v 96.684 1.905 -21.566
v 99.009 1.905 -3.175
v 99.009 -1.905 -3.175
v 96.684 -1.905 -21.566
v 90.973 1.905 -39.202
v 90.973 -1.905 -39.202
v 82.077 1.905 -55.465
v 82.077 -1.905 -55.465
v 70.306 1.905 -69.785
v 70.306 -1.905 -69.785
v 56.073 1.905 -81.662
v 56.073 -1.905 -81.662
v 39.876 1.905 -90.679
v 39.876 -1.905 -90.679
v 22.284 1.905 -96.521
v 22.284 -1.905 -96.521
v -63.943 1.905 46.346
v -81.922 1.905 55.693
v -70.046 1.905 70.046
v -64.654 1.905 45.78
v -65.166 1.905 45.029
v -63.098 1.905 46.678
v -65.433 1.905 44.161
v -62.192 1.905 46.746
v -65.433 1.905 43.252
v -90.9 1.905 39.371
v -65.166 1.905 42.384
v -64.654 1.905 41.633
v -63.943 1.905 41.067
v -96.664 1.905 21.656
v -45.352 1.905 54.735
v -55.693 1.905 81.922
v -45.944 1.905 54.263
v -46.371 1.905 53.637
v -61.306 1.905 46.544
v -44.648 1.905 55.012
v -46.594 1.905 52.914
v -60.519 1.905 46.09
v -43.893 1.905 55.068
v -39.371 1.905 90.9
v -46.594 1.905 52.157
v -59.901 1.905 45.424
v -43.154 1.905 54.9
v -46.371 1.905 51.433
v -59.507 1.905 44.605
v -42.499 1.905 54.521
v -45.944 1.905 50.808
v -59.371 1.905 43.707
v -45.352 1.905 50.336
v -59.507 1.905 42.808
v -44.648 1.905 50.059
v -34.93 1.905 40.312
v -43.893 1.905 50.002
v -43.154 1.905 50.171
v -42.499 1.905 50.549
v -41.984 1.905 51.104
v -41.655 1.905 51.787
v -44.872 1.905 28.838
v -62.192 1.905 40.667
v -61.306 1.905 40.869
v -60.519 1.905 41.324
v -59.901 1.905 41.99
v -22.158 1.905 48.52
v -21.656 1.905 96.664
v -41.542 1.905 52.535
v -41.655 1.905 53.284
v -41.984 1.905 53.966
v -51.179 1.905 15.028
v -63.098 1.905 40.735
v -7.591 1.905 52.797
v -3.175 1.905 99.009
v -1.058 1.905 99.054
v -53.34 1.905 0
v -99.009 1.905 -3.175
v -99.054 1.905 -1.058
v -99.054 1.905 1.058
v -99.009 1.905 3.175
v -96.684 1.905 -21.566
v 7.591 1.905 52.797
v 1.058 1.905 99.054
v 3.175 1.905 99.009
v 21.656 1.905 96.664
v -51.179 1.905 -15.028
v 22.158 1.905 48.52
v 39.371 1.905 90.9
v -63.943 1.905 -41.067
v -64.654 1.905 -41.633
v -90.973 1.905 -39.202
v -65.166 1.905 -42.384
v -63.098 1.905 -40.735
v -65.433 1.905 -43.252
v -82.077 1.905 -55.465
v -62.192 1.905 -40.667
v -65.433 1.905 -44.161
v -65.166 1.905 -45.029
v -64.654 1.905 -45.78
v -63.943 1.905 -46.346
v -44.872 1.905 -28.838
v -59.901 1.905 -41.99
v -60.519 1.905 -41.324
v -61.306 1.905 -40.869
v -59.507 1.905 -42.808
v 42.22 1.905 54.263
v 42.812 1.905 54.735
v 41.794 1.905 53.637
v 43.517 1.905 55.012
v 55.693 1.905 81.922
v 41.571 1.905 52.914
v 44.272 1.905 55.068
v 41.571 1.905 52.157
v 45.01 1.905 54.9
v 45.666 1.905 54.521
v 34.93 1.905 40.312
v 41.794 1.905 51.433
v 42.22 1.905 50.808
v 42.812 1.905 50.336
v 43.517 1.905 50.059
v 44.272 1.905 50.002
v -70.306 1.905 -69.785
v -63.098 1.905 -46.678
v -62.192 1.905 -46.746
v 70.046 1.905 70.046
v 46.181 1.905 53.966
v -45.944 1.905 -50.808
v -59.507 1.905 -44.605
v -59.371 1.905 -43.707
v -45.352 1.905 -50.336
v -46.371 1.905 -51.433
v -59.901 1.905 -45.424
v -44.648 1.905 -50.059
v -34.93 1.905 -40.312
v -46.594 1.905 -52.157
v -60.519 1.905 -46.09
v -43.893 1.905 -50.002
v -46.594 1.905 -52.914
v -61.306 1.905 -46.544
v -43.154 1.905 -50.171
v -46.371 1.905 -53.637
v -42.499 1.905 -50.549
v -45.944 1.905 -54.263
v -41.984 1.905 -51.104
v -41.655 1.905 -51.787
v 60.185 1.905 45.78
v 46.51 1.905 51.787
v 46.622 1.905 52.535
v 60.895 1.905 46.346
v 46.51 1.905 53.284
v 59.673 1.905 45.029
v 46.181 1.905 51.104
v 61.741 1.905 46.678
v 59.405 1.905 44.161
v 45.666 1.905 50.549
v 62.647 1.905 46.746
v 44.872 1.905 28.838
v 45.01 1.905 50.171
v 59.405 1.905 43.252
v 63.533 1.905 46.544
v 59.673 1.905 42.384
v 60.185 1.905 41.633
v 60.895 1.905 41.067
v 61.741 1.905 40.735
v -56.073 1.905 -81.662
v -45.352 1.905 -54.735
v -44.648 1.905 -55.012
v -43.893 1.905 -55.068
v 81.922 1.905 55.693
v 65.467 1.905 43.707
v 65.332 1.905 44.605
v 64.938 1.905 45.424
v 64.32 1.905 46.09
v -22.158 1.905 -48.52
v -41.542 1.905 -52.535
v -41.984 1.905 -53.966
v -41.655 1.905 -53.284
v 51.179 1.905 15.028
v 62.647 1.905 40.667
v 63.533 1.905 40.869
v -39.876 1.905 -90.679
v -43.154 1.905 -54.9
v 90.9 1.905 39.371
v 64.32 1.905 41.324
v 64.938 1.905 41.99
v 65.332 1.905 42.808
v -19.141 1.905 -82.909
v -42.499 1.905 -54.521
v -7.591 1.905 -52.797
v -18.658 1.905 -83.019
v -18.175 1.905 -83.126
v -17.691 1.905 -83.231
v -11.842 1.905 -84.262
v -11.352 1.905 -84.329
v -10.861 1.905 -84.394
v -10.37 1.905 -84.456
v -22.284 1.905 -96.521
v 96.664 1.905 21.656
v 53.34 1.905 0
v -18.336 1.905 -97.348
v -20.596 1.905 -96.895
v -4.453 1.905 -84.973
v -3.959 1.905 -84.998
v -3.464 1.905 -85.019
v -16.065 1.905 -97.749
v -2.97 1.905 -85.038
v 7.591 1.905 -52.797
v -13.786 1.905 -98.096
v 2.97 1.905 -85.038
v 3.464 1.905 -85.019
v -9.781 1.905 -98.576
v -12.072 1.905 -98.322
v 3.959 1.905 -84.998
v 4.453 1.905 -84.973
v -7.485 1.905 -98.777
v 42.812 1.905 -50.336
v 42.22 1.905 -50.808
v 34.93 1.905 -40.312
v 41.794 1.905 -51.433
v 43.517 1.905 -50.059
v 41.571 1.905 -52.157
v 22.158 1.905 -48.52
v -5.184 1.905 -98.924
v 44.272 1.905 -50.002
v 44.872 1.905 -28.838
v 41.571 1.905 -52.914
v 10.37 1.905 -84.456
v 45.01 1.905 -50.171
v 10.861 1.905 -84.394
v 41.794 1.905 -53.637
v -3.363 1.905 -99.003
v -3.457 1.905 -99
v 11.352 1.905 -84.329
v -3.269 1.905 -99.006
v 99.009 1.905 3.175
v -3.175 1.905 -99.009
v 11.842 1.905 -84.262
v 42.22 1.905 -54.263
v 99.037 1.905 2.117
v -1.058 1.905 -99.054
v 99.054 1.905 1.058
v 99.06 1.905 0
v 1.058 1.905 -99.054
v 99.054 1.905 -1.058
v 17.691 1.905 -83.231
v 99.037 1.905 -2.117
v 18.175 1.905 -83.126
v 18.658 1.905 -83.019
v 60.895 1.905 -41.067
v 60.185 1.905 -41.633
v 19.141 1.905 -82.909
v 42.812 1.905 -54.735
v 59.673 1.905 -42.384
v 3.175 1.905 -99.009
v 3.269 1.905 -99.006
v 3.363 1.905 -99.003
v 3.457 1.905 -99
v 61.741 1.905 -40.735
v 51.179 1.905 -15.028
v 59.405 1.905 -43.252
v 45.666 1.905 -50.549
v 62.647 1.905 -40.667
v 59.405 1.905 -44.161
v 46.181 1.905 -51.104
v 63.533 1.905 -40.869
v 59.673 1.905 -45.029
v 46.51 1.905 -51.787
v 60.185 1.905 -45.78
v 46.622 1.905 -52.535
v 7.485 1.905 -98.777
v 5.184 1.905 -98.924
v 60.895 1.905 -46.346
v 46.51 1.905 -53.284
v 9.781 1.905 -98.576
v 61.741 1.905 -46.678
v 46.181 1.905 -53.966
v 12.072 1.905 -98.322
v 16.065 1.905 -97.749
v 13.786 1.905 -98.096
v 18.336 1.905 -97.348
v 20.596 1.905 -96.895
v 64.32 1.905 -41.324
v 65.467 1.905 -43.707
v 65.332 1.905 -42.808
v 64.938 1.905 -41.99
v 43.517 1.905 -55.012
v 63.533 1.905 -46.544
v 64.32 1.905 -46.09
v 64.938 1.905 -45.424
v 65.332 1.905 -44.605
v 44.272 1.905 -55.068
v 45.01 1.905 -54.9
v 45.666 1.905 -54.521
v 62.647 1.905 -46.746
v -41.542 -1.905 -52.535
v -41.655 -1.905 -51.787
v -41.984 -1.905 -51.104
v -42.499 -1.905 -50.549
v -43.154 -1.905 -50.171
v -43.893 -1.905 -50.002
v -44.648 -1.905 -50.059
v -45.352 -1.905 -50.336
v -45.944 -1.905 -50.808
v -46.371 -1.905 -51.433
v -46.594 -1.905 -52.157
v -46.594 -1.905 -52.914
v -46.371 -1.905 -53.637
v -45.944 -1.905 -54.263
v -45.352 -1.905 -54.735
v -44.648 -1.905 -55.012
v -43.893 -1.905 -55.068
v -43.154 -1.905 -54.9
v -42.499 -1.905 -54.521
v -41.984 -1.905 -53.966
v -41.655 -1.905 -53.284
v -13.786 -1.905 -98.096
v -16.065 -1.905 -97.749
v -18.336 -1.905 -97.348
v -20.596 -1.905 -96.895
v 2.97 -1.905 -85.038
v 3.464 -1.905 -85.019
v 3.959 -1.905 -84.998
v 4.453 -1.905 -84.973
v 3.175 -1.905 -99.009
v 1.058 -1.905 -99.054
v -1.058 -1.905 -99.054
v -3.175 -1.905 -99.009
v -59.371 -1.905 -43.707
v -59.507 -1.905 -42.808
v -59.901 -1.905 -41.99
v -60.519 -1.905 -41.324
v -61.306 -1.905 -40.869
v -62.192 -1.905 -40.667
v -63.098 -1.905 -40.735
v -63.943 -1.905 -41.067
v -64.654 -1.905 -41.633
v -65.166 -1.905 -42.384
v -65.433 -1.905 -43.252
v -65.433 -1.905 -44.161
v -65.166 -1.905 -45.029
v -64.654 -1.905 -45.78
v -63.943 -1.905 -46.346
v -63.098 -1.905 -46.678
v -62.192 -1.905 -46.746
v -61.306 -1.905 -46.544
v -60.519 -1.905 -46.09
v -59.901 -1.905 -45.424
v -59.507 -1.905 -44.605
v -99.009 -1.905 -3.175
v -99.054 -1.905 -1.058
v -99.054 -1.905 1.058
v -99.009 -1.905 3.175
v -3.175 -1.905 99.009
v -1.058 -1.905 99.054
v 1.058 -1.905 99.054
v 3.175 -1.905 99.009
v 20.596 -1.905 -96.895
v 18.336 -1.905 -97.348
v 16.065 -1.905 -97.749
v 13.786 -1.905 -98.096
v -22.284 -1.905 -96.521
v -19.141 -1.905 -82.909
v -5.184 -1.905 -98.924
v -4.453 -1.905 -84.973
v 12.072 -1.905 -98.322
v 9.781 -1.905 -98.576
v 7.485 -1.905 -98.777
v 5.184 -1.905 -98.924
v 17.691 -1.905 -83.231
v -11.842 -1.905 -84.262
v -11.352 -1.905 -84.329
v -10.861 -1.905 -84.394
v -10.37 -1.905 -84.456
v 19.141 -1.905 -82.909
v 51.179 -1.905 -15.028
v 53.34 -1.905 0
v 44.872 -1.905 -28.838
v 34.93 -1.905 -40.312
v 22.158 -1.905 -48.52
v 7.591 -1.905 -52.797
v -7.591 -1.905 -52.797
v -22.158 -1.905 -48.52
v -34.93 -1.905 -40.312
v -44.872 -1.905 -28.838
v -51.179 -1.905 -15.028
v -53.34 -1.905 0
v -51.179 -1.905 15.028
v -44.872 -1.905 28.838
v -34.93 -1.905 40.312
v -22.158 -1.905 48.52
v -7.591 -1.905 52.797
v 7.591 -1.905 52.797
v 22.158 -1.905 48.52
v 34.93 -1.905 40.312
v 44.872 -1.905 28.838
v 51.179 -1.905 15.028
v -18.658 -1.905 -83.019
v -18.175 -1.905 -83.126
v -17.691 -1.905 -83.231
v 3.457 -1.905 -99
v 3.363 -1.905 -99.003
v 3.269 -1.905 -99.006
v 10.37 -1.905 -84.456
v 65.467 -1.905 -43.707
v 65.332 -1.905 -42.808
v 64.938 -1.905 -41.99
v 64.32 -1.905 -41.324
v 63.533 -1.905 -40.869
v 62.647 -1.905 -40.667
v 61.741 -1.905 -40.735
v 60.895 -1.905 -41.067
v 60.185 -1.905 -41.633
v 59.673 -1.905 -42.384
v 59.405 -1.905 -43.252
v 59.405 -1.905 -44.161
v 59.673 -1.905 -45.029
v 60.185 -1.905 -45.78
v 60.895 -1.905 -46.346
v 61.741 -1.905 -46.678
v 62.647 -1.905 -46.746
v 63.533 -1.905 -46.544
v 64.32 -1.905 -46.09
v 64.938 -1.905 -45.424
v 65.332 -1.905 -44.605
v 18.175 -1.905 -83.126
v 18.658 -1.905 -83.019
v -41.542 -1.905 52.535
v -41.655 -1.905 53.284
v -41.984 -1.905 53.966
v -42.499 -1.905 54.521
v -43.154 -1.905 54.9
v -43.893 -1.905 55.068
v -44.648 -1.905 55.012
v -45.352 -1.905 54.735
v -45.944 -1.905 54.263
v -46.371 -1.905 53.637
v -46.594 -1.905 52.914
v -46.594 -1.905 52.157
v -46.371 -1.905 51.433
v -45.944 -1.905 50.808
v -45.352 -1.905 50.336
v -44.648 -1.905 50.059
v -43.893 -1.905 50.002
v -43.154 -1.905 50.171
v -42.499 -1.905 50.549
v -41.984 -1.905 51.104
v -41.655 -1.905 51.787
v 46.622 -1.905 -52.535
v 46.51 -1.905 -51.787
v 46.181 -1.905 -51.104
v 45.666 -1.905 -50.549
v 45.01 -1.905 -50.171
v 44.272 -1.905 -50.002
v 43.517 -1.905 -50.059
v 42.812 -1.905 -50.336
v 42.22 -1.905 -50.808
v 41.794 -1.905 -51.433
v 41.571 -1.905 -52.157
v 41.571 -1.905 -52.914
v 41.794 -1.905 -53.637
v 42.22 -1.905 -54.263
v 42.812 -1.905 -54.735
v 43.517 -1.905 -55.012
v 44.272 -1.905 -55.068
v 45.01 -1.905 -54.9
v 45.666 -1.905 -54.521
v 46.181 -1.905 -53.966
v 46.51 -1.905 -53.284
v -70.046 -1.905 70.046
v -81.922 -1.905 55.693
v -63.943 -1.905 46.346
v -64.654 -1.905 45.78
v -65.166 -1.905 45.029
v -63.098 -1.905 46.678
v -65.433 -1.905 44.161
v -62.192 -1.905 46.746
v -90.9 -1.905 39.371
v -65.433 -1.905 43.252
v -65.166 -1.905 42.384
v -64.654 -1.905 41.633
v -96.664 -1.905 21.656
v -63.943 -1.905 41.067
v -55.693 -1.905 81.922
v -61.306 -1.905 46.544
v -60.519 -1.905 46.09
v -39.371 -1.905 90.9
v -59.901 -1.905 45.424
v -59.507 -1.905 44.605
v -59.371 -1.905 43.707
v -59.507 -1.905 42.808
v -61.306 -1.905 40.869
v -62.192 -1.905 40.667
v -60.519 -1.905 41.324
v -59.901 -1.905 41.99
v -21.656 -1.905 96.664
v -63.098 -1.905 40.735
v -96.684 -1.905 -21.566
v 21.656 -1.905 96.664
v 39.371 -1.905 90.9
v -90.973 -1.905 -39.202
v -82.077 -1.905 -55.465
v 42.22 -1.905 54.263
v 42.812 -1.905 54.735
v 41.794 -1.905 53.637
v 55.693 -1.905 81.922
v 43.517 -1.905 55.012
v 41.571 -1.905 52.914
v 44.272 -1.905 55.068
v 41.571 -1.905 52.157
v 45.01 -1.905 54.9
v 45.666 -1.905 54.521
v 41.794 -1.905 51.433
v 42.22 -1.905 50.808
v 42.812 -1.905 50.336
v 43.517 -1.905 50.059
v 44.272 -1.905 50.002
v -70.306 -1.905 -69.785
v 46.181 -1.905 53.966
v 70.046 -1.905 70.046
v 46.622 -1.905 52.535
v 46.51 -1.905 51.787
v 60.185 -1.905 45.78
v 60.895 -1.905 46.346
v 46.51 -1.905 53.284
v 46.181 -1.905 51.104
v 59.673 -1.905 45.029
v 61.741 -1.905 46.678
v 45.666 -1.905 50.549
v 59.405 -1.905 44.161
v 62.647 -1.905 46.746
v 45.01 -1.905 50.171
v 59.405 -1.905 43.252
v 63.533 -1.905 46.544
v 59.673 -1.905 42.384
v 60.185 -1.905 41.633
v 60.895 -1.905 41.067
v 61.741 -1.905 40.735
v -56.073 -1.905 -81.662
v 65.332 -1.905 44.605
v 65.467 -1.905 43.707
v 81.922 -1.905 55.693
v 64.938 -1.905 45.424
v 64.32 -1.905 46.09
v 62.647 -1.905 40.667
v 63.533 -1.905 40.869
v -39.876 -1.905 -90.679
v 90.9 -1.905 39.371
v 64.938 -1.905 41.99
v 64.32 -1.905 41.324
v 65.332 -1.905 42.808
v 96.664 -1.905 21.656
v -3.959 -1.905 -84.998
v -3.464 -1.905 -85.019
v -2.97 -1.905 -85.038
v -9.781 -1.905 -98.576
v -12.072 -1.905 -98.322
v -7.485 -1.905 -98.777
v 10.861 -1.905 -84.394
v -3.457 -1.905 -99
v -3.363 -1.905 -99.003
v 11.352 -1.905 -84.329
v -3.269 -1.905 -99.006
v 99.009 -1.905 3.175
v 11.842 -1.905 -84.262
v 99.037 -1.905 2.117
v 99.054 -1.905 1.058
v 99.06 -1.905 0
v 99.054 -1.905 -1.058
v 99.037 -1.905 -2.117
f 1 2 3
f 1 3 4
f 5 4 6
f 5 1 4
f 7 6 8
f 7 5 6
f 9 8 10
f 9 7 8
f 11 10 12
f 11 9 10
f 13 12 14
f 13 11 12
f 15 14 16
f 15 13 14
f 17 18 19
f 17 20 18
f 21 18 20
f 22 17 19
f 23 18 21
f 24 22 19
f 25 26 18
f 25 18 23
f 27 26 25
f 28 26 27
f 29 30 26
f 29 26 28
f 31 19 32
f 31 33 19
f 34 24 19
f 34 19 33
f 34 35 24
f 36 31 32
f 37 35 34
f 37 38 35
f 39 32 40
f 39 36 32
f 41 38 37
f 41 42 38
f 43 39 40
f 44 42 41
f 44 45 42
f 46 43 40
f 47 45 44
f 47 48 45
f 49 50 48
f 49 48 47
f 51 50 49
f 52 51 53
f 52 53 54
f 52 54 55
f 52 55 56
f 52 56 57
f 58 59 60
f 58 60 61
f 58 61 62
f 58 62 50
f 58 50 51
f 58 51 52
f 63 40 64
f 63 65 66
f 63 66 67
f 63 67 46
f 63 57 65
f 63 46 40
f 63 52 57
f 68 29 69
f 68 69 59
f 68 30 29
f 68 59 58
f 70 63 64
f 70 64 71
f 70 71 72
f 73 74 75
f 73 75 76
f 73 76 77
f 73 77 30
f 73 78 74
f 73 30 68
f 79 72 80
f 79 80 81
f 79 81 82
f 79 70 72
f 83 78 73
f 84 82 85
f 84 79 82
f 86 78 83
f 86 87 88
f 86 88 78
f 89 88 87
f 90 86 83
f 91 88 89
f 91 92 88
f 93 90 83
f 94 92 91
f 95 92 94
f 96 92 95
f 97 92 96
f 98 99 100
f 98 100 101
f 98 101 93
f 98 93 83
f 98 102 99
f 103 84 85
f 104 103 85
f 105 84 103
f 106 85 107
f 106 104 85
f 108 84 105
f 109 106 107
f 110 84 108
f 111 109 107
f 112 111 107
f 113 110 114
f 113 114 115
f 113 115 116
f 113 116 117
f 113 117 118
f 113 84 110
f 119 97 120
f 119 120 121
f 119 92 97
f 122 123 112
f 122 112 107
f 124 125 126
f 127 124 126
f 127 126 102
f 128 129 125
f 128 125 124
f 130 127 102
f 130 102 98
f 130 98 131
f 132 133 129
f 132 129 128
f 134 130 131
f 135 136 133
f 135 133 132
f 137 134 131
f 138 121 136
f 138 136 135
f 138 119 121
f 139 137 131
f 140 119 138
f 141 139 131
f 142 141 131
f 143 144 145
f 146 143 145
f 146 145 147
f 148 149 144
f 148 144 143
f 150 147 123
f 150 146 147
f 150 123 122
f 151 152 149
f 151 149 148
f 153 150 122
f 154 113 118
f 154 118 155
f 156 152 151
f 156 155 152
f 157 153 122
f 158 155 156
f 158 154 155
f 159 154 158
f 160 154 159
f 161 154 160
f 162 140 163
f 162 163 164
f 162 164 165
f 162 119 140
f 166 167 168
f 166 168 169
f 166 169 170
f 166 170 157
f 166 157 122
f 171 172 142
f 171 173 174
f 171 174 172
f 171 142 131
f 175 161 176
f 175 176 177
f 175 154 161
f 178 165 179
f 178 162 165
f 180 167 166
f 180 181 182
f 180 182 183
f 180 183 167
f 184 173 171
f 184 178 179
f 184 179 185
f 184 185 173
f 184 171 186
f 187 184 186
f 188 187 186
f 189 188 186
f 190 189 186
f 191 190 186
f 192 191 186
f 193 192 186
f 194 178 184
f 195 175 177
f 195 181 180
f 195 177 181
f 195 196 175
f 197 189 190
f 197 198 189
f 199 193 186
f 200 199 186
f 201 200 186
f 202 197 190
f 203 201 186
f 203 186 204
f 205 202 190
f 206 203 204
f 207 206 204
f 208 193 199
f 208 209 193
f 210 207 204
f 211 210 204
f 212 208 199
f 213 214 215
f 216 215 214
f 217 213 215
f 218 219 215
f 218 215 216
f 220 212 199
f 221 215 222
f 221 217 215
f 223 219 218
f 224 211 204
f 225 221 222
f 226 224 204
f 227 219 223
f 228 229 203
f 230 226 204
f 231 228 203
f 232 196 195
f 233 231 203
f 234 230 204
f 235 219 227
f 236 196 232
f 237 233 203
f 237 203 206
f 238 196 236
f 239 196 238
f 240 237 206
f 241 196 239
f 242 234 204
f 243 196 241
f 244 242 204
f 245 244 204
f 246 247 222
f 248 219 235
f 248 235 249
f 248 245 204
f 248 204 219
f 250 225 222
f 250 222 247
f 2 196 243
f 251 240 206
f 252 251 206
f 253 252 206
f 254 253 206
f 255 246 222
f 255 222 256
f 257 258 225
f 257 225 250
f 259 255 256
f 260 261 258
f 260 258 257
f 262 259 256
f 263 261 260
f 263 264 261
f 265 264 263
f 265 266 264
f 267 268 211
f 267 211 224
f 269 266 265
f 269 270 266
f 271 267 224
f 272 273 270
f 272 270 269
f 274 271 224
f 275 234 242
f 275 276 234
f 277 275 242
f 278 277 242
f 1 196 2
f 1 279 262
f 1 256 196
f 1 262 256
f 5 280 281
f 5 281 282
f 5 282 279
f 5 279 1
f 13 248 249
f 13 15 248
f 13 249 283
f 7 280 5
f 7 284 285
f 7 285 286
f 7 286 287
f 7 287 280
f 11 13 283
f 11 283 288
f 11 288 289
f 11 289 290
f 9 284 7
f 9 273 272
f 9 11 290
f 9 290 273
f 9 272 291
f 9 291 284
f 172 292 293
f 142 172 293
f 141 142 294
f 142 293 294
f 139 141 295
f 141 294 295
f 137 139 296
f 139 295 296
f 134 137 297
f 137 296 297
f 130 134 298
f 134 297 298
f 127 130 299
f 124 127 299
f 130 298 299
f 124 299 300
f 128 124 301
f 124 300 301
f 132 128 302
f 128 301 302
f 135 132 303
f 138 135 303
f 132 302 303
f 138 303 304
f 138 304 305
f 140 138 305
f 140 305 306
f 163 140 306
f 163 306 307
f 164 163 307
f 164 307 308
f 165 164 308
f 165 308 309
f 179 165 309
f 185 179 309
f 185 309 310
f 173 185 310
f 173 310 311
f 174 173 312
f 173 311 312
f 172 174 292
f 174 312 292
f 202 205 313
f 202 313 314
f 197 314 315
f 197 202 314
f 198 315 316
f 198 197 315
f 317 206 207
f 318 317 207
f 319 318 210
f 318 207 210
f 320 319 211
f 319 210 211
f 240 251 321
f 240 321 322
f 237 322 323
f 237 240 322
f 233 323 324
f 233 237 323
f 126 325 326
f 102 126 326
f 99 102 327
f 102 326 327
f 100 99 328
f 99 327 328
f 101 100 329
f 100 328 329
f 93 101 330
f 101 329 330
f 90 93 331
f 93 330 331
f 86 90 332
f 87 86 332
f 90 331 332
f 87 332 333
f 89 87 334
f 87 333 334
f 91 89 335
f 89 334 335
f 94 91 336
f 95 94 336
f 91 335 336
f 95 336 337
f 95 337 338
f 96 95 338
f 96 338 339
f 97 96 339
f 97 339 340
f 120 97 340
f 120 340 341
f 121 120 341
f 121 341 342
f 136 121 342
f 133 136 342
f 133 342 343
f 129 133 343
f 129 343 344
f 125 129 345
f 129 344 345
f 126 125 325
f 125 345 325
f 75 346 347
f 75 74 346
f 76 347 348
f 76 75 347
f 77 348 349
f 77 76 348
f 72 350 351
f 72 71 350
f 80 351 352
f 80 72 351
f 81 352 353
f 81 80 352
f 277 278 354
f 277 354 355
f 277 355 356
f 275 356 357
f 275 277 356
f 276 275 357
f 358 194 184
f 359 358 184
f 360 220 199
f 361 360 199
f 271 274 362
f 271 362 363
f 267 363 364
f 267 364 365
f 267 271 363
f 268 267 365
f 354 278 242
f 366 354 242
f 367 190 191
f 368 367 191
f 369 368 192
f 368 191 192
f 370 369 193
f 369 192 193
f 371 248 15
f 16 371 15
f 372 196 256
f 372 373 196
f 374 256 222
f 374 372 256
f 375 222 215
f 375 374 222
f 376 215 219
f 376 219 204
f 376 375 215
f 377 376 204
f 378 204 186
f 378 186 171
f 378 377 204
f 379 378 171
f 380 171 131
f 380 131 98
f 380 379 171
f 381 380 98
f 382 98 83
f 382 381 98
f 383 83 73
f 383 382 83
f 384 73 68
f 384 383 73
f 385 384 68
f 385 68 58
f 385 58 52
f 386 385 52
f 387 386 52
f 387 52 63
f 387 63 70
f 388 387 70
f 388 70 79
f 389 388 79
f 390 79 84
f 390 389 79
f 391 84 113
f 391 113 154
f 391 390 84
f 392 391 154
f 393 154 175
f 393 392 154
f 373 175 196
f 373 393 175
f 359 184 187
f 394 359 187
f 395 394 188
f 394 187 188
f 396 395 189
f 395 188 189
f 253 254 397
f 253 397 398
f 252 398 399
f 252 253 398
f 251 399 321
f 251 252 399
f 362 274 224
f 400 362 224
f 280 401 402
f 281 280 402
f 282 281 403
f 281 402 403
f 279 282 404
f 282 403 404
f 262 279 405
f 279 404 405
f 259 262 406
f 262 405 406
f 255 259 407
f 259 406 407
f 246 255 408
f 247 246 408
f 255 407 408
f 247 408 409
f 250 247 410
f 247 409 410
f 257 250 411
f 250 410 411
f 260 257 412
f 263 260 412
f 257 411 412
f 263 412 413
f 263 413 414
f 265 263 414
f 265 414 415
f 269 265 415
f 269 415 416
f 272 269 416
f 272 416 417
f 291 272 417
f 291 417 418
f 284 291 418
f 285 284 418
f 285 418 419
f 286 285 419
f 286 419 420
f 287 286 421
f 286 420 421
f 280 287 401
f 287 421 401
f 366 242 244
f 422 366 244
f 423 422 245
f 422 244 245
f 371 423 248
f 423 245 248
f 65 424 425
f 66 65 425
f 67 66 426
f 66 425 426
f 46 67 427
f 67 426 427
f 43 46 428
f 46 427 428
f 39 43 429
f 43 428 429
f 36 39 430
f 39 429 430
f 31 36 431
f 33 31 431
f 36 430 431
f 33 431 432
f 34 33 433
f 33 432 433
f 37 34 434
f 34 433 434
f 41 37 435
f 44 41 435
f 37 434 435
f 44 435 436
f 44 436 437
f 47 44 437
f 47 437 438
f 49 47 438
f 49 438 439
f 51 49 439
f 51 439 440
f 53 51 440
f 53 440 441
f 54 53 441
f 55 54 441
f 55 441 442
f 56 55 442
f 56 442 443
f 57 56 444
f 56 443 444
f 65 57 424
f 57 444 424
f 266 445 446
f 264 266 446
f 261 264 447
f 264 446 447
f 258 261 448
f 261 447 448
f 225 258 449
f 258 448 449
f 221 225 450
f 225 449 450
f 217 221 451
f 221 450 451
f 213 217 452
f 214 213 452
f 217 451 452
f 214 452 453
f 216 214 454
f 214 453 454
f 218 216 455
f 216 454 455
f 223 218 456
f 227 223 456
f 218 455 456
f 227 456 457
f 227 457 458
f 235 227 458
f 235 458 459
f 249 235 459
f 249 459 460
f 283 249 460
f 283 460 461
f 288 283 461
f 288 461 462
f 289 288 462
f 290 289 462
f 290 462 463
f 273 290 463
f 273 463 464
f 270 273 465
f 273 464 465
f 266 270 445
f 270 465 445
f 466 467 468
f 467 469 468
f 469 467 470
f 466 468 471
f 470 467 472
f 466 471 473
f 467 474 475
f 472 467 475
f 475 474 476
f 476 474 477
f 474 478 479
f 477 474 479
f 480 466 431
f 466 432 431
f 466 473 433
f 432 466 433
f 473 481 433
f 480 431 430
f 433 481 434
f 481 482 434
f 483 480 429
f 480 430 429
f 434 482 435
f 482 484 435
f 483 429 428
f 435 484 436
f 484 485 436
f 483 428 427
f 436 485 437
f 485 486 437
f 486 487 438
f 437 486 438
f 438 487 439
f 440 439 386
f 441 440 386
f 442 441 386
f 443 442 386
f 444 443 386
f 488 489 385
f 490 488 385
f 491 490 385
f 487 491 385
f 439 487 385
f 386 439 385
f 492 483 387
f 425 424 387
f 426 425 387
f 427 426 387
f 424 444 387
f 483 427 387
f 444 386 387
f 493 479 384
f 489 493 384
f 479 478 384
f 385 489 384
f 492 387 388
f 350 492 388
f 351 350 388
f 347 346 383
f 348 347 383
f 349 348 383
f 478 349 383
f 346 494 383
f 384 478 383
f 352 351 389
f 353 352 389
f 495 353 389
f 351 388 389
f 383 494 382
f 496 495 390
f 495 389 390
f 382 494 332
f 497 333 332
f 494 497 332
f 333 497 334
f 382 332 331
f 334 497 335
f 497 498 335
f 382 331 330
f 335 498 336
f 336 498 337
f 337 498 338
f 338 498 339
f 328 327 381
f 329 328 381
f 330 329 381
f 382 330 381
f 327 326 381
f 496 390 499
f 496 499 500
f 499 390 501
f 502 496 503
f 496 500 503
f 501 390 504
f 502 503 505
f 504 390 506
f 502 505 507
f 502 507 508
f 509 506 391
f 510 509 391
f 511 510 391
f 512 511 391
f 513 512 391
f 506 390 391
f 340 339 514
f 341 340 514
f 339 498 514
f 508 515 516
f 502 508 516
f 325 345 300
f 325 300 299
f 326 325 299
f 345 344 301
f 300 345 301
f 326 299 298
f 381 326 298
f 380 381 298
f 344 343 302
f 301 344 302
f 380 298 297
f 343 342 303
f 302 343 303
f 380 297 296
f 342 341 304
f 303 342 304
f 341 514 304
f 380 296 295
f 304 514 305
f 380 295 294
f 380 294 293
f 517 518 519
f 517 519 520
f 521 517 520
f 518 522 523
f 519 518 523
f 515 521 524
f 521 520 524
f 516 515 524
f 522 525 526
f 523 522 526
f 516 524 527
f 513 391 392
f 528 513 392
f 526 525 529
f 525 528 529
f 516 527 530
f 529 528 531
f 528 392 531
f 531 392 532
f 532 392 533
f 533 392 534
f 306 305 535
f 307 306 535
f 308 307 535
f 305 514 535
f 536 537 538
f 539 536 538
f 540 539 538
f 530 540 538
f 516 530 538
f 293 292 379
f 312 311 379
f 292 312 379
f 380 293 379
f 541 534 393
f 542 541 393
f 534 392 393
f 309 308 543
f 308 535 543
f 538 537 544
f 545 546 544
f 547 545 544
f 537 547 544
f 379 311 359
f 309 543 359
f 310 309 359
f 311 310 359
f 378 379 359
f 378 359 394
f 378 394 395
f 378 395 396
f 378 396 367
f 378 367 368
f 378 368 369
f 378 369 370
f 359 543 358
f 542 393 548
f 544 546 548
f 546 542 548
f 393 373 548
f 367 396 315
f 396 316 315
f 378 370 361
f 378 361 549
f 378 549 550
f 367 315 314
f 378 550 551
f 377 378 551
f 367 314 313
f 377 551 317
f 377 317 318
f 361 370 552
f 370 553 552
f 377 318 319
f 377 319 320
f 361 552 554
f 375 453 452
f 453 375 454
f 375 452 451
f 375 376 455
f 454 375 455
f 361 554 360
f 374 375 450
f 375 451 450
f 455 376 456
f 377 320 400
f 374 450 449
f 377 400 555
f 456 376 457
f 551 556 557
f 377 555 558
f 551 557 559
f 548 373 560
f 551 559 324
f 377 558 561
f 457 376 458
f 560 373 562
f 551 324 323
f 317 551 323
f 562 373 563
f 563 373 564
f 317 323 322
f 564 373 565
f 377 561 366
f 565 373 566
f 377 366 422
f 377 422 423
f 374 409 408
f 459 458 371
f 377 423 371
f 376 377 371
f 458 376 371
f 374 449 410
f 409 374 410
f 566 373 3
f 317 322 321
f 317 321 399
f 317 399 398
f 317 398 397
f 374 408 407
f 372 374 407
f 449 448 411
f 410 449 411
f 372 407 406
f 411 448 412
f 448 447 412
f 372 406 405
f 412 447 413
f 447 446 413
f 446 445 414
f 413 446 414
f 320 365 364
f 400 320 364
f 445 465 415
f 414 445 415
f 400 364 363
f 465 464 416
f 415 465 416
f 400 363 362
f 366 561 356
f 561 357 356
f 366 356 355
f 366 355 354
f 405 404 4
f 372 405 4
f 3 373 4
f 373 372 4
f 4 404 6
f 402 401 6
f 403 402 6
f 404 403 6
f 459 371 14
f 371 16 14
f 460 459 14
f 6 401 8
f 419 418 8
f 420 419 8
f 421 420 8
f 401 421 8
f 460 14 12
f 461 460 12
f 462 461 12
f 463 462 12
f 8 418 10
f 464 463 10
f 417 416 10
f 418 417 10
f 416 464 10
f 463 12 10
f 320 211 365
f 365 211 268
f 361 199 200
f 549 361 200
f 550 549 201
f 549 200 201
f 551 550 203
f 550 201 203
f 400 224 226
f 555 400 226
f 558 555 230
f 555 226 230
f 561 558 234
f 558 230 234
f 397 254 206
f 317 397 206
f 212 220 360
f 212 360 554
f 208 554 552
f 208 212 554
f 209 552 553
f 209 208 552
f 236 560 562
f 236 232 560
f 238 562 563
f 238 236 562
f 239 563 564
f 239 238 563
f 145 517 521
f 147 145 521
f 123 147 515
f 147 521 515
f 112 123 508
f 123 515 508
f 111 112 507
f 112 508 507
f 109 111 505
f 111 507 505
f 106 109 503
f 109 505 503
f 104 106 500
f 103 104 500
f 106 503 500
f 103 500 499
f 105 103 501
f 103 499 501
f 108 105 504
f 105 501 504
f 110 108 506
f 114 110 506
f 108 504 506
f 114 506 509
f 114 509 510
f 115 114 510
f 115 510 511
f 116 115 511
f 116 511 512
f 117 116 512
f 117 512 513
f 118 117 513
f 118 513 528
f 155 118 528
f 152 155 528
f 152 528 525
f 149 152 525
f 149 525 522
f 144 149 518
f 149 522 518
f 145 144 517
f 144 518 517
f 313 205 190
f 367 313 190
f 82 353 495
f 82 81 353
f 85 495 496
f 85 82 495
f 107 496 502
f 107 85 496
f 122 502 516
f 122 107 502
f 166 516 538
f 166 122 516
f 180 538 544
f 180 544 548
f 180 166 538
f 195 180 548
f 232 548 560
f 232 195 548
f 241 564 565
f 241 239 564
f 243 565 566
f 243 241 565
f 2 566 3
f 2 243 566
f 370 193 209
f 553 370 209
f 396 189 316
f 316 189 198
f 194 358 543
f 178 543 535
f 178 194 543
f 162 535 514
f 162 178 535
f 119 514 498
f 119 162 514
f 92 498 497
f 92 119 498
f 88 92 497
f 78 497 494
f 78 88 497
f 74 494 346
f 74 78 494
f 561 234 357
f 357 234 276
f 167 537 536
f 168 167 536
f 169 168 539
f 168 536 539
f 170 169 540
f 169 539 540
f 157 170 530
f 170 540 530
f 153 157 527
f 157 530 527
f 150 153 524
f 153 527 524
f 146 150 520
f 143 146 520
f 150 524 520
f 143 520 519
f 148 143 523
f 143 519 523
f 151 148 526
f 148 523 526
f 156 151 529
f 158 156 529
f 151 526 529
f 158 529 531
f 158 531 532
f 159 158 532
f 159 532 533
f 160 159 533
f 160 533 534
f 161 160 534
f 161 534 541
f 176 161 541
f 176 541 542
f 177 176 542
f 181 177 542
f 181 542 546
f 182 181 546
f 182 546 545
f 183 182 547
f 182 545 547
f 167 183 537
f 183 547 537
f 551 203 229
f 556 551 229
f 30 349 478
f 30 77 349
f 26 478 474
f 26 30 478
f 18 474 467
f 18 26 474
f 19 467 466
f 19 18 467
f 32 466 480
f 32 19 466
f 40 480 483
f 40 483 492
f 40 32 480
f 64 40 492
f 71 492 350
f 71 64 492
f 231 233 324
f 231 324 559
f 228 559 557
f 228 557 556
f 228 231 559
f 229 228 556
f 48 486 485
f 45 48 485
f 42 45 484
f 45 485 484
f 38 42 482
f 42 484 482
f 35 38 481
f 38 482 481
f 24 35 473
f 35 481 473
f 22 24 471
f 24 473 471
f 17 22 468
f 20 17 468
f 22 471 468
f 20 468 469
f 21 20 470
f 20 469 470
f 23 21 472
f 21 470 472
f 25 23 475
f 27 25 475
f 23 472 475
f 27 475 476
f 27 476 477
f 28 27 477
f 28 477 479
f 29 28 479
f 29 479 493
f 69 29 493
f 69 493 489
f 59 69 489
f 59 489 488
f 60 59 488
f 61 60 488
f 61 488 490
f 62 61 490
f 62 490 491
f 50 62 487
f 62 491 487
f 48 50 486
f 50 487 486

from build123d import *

# Parameters (mm, degrees)
F_98MM_6ID_CENTERING_RING_SKETCH_7_R = 53.34
CENTERING_RING_EXTRUDE_DEPTH         = 1.905
CENTERING_RING_EXTRUDE_DEPTH_BACK    = 1.905
CUT_EXTRUDE3_DEPTH                   = 4.81
CIRPATTERN1_COUNT                    = 6
CIRPATTERN1_ANGLE                    = 25
SKETCH5_R                            = 3.048
SKETCH5_R_2                          = 2.54
CUT_EXTRUDE4_DEPTH                   = 3.81


with BuildPart() as part:
    # 98mm - 6ID centering ring sketch_7 → Centering Ring Extrude (new body, two sides)
    with BuildSketch(Plane(origin=(0, 0, 0), x_dir=(1, 0, 0), z_dir=(0, 1, 0))) as centering_ring_extrude_sk:
        with BuildLine():
            Line((56.425744124, 3.175), (99.009105516, 3.175))
            ThreePointArc((99.009105516, 3.175), (70.045997744, 70.045997744), (3.175, 99.009105516))
            Line((3.175, 99.009105516), (3.175, 56.425744124))
            ThreePointArc((3.175, 56.425744124), (0, 56.515), (-3.175, 56.425744124))
            Line((-3.175, 56.425744124), (-3.175, 99.009105516))
            ThreePointArc((-3.175, 99.009105516), (-70.045997744, 70.045997744), (-99.009105516, 3.175))
            Line((-99.009105516, 3.175), (-56.425744124, 3.175))
            ThreePointArc((-56.425744124, 3.175), (-56.515, 0), (-56.425744124, -3.175))
            Line((-56.425744124, -3.175), (-99.009105516, -3.175))
            ThreePointArc((-99.009105516, -3.175), (-70.045997744, -70.045997744), (-3.175, -99.009105516))
            Line((-3.175, -99.009105516), (-3.175, -56.425744124))
            ThreePointArc((-3.175, -56.425744124), (0, -56.515), (3.175, -56.425744124))
            Line((3.175, -56.425744124), (3.175, -99.009105516))
            ThreePointArc((3.175, -99.009105516), (70.045997744, -70.045997744), (99.009105516, -3.175))
            Line((99.009105516, -3.175), (56.425744124, -3.175))
            ThreePointArc((56.425744124, -3.175), (56.515, 0), (56.425744124, 3.175))
        make_face()
        Circle(F_98MM_6ID_CENTERING_RING_SKETCH_7_R, mode=Mode.SUBTRACT)
        with BuildLine():
            ThreePointArc((99.06, 0), (99.047275562, 1.587703943), (99.009105516, 3.175))
            Line((99.009105516, 3.175), (56.425744124, 3.175))
            ThreePointArc((56.425744124, 3.175), (56.515, 0), (56.425744124, -3.175))
            Line((56.425744124, -3.175), (99.009105516, -3.175))
            ThreePointArc((99.009105516, -3.175), (99.047275562, -1.587703943), (99.06, 0))
        make_face()
        with BuildLine():
            Line((3.175, 56.425744124), (3.175, 99.009105516))
            ThreePointArc((3.175, 99.009105516), (0, 99.06), (-3.175, 99.009105516))
            Line((-3.175, 99.009105516), (-3.175, 56.425744124))
            ThreePointArc((-3.175, 56.425744124), (0, 56.515), (3.175, 56.425744124))
        make_face()
        with BuildLine():
            Line((-56.425744124, 3.175), (-99.009105516, 3.175))
            ThreePointArc((-99.009105516, 3.175), (-99.06, 0), (-99.009105516, -3.175))
            Line((-99.009105516, -3.175), (-56.425744124, -3.175))
            ThreePointArc((-56.425744124, -3.175), (-56.515, 0), (-56.425744124, 3.175))
        make_face()
        with BuildLine():
            ThreePointArc((-3.175, -99.009105516), (0, -99.06), (3.175, -99.009105516))
            Line((3.175, -99.009105516), (3.175, -56.425744124))
            ThreePointArc((3.175, -56.425744124), (0, -56.515), (-3.175, -56.425744124))
            Line((-3.175, -56.425744124), (-3.175, -99.009105516))
        make_face()
    extrude(amount=CENTERING_RING_EXTRUDE_DEPTH)
    extrude(centering_ring_extrude_sk.sketch, amount=-CENTERING_RING_EXTRUDE_DEPTH_BACK)

    # Sketch3 → Cut-Extrude3 (cut, through all)
    with BuildSketch(Plane(origin=(0, 1.905, 0), x_dir=(1, 0, 0), z_dir=(0, 1, 0))):
        with BuildLine():
            Line((-22.283651443, 96.521098618), (-19.141085214, 82.909148813))
            ThreePointArc((-19.141085214, 82.909148813), (-18.41684675, 83.073027246), (-17.691205772, 83.230579346))
            Line((-17.691205772, 83.230579346), (-20.595732092, 96.895301329))
            ThreePointArc((-20.595732092, 96.895301329), (-21.440508157, 96.711882465), (-22.283651443, 96.521098618))
        make_face()
    cut_extrude3 = extrude(amount=-CUT_EXTRUDE3_DEPTH, mode=Mode.SUBTRACT)

    # CirPattern1: Cut-Extrude3 ×6 about axis
    cirpattern1_axis = Axis((0, 0, 0), (0, -1, 0))
    for i in range(1, CIRPATTERN1_COUNT):
        add(cut_extrude3.rotate(cirpattern1_axis, i * CIRPATTERN1_ANGLE / (CIRPATTERN1_COUNT - 1)), mode=Mode.SUBTRACT)

    # Sketch5 → Cut-Extrude4 (cut)
    with BuildSketch(Plane.XZ.offset(1.905)):
        with Locations((-62.419385775, 43.70652445)):
            Circle(SKETCH5_R)
        with Locations((-44.082374272, 52.535327909)):
            Circle(SKETCH5_R_2)
        with Locations((44.082374272, 52.535327909)):
            Circle(SKETCH5_R_2)
        with Locations((62.419385775, 43.70652445)):
            Circle(SKETCH5_R)
        with Locations((62.419385775, -43.70652445)):
            Circle(SKETCH5_R)
        with Locations((44.082374272, -52.535327909)):
            Circle(SKETCH5_R_2)
        with Locations((-44.082374272, -52.535327909)):
            Circle(SKETCH5_R_2)
        with Locations((-62.419385775, -43.70652445)):
            Circle(SKETCH5_R)
    extrude(amount=-CUT_EXTRUDE4_DEPTH, mode=Mode.SUBTRACT)


solid = part.part
